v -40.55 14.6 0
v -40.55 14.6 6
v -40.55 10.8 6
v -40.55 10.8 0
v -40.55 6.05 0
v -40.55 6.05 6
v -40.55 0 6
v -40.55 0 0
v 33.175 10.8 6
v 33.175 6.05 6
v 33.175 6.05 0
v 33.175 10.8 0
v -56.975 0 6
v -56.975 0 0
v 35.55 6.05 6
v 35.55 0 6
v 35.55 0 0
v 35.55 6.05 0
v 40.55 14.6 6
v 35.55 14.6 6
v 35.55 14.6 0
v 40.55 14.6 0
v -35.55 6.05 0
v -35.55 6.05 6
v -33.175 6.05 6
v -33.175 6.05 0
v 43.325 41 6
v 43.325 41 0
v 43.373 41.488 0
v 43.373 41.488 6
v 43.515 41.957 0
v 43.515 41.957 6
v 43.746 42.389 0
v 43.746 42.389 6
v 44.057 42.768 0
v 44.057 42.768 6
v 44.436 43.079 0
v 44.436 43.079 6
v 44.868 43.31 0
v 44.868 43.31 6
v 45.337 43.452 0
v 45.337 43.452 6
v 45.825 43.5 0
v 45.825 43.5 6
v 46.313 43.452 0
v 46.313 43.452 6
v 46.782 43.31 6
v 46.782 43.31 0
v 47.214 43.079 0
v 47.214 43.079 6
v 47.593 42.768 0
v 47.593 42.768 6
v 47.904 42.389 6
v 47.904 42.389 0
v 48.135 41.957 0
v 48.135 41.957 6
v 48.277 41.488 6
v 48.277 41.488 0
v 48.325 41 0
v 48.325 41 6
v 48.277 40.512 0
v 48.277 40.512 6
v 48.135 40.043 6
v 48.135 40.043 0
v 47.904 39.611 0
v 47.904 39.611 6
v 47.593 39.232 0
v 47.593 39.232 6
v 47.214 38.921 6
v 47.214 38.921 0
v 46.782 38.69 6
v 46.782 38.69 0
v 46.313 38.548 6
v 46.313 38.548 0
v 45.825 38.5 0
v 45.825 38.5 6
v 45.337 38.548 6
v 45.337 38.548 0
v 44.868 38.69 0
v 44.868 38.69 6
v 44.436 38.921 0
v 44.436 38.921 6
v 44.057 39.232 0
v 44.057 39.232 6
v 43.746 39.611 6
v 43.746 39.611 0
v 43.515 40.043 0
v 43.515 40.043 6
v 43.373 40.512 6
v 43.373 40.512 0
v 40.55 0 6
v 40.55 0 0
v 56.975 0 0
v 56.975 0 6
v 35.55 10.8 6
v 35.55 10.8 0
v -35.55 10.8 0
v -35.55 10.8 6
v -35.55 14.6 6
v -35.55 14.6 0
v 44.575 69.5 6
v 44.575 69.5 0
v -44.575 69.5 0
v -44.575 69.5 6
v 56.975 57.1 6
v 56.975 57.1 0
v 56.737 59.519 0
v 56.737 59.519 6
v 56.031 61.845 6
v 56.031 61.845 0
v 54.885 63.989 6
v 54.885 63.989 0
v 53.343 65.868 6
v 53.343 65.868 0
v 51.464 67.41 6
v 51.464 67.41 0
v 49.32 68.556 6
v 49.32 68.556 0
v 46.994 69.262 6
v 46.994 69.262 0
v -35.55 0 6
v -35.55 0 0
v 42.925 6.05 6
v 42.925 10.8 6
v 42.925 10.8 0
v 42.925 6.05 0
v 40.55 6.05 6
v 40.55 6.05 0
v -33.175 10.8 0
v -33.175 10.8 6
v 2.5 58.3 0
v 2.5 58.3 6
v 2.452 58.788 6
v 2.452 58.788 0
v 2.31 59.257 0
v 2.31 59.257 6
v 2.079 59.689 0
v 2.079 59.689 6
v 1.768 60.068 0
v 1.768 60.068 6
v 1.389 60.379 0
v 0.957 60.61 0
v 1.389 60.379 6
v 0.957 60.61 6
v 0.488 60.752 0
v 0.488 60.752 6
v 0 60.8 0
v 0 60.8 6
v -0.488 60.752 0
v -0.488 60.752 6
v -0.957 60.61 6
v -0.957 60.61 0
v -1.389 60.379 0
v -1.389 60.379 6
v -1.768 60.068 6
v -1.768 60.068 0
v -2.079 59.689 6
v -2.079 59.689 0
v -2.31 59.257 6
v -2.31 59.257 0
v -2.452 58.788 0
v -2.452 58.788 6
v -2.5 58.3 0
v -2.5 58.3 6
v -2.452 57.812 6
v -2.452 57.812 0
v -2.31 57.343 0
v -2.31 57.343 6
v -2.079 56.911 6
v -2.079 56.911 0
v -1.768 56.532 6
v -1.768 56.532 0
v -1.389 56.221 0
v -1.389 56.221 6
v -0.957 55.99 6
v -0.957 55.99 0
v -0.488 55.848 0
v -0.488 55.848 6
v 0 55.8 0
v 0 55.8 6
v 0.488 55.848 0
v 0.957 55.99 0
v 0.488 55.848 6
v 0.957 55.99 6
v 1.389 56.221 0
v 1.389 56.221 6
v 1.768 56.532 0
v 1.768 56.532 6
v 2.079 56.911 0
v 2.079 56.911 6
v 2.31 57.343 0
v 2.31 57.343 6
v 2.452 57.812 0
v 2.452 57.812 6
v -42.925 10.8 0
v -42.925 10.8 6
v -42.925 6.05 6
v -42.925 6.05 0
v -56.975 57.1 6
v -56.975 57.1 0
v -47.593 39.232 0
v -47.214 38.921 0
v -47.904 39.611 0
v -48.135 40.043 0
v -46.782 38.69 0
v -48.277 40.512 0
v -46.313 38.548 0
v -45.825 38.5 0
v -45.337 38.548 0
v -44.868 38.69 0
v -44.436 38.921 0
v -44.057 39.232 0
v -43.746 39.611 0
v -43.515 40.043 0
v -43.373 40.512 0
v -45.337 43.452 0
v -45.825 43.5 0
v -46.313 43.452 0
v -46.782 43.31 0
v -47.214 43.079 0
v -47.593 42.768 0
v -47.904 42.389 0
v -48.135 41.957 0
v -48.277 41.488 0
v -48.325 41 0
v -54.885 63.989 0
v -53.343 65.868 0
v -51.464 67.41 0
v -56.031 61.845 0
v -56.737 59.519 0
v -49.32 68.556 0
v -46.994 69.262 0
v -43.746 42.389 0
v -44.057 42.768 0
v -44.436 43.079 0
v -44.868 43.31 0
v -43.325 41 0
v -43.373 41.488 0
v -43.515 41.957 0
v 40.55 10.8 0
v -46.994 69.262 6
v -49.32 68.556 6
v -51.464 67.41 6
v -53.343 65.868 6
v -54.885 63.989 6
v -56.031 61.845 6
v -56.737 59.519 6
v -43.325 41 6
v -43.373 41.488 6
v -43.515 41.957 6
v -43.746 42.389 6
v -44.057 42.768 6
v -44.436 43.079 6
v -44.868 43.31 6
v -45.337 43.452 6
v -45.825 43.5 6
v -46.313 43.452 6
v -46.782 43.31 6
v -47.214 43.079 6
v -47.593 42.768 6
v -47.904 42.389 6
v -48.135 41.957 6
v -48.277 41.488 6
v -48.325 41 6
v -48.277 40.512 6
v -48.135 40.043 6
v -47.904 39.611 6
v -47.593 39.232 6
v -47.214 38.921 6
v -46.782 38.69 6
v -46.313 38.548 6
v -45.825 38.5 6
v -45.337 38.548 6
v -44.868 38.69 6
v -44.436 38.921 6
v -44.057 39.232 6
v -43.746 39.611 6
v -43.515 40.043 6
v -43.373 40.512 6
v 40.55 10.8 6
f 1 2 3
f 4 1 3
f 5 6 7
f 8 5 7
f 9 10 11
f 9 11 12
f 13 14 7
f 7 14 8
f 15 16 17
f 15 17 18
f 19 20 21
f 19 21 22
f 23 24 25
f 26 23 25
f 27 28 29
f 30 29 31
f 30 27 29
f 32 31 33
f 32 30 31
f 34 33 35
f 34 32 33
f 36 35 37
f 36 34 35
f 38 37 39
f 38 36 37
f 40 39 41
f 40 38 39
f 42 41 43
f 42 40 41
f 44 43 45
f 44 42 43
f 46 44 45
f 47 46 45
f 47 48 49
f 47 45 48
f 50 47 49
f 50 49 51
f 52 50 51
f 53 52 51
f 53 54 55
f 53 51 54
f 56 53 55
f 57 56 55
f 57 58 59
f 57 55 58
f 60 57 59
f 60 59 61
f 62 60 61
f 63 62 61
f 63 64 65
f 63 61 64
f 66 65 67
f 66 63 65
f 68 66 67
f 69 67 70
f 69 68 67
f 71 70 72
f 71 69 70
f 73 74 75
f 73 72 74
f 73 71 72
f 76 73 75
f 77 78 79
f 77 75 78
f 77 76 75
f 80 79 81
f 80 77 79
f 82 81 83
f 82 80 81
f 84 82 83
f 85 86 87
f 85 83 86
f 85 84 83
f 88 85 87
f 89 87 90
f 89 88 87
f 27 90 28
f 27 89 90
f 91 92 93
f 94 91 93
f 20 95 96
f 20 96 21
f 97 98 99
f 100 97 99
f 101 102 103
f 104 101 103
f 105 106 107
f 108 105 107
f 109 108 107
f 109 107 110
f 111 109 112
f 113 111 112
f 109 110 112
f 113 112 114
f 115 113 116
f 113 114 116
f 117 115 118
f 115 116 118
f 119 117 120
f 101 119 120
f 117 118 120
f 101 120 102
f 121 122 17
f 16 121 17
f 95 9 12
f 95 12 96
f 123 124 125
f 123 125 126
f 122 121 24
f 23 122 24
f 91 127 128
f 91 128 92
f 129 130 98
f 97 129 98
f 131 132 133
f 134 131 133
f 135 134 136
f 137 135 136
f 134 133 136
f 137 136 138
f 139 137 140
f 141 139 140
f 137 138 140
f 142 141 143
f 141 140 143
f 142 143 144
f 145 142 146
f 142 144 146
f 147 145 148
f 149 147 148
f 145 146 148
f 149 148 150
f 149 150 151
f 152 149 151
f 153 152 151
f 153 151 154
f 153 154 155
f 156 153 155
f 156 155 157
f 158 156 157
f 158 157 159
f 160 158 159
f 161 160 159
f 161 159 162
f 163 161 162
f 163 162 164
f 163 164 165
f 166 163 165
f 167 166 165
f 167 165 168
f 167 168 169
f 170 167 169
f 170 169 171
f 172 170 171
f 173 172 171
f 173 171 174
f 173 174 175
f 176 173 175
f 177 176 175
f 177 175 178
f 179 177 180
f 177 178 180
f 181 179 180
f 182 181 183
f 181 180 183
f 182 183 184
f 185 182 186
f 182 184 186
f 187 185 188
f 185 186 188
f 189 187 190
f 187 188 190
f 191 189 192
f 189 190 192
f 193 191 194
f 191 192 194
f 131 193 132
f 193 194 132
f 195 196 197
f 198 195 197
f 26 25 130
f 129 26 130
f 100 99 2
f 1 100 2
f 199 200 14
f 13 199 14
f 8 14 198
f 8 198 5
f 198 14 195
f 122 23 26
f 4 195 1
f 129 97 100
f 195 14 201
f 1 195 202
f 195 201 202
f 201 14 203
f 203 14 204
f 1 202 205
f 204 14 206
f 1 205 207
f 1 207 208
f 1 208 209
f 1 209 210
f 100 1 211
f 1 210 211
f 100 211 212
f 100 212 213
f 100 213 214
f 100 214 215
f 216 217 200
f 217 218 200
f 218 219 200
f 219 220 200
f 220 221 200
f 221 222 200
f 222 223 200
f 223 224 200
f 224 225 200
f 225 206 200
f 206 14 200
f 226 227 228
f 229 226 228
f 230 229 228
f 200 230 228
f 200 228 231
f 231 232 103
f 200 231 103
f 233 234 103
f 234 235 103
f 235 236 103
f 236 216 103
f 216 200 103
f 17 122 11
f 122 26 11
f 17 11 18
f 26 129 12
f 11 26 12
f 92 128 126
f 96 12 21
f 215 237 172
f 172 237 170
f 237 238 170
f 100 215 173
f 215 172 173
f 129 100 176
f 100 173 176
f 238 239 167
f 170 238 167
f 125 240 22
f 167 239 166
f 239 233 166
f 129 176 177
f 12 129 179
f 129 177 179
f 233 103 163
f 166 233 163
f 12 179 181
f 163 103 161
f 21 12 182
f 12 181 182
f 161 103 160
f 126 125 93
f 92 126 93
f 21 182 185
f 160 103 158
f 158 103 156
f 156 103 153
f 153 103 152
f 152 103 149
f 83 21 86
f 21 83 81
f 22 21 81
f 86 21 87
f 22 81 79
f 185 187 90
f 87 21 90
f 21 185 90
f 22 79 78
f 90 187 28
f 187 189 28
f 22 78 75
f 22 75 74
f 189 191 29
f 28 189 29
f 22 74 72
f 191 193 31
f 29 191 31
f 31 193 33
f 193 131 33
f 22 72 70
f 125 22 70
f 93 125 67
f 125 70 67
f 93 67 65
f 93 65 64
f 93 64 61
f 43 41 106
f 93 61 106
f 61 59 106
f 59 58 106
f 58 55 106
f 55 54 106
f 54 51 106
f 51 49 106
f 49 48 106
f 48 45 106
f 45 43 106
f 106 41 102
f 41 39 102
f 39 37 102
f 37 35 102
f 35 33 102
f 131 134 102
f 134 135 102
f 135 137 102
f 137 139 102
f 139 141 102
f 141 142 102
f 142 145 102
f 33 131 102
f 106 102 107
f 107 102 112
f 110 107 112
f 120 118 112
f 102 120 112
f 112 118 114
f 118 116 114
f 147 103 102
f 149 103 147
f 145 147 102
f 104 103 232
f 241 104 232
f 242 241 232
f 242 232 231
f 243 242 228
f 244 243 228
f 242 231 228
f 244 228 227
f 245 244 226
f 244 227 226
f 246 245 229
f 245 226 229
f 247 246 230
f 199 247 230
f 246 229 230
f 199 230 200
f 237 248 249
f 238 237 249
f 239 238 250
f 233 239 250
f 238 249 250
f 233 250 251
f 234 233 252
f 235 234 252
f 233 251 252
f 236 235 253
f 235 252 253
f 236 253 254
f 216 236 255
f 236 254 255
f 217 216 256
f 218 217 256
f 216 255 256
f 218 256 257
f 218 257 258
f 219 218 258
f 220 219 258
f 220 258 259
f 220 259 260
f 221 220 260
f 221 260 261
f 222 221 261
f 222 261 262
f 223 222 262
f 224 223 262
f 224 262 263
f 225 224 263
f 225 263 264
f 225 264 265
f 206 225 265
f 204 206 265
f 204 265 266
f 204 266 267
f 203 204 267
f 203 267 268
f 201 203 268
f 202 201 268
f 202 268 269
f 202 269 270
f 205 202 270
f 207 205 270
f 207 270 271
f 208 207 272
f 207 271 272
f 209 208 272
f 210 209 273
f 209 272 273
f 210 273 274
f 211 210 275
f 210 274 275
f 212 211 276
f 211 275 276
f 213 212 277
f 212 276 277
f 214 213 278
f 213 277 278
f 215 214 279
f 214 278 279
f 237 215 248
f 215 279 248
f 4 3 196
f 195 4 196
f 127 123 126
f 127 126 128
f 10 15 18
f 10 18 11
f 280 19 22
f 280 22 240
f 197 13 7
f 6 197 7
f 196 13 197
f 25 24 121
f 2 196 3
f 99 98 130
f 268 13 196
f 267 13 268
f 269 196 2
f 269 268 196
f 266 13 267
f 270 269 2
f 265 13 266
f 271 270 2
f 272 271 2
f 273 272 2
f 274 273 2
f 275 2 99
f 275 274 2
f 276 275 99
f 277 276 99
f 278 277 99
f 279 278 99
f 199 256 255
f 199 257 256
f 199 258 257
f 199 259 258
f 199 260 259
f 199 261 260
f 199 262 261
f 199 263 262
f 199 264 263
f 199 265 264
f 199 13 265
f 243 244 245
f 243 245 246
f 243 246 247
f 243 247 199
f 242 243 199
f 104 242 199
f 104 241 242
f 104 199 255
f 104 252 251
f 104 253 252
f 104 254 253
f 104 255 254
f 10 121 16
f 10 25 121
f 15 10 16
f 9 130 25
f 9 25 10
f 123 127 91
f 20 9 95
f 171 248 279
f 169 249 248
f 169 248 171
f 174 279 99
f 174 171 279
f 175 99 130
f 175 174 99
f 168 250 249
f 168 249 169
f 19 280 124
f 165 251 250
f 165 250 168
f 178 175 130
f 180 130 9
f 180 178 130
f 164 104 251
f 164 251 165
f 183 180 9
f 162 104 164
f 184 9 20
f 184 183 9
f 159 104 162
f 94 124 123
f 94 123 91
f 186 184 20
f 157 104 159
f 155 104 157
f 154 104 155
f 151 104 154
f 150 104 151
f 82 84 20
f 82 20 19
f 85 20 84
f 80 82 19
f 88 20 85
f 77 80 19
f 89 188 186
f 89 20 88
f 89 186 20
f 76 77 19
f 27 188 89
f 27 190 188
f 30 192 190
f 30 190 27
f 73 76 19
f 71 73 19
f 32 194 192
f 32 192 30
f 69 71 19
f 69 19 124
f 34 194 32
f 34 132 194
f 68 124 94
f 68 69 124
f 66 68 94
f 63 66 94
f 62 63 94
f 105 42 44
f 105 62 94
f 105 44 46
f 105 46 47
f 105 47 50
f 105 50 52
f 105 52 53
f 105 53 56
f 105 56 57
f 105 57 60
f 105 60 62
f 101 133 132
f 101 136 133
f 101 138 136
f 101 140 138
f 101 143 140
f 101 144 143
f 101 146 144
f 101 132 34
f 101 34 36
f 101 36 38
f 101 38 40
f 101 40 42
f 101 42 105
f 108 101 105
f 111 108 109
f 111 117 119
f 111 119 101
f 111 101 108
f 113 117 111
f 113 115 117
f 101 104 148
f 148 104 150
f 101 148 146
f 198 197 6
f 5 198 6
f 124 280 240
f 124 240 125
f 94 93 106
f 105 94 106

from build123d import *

# Parameters (mm, degrees)
BOSS_EXTRUDE1_DEPTH = 6
CUT_EXTRUDE1_DEPTH  = 91.068866014
SKETCH4_R           = 2.5
HOLE1_DEPTH         = 91.068866014
SKETCH5_R           = 2.5
HOLE2_DEPTH         = 91.068866014


with BuildPart() as part:
    # Sketch2 → Boss-Extrude1 (new body)
    with BuildSketch(Plane.XY):
        with BuildLine():
            Line((-56.975, 0), (56.975, 0))
            Line((56.975, 0), (56.975, 57.1))
            ThreePointArc((56.975, 57.1), (53.343124087, 65.868124087), (44.575, 69.5))
            Line((44.575, 69.5), (-44.575, 69.5))
            ThreePointArc((-44.575, 69.5), (-53.343124087, 65.868124087), (-56.975, 57.1))
            Line((-56.975, 57.1), (-56.975, 0))
        make_face()
    extrude(amount=BOSS_EXTRUDE1_DEPTH)

    # Sketch3 → Cut-Extrude1 (cut, through all)
    with BuildSketch(Plane.XY.offset(6)):
        Polygon((-40.55, 0), (-35.55, 0), (-35.55, 6.05), (-33.175, 6.05), (-33.175, 10.8), (-35.55, 10.8), (-35.55, 14.6), (-40.55, 14.6), (-40.55, 10.8), (-42.925, 10.8), (-42.925, 6.05), (-40.55, 6.05), align=None)
    cut_extrude1 = extrude(amount=-CUT_EXTRUDE1_DEPTH, mode=Mode.SUBTRACT)

    # Sketch4 → Hole1 (cut, through all)
    with BuildSketch(Plane.XY.offset(6)):
        with Locations((-45.825, 41)):
            Circle(SKETCH4_R)
    hole1 = extrude(amount=-HOLE1_DEPTH, mode=Mode.SUBTRACT)

    # Sketch5 → Hole2 (cut, through all)
    with BuildSketch(Plane.XY.offset(6)):
        with Locations((0, 58.3)):
            Circle(SKETCH5_R)
    extrude(amount=-HOLE2_DEPTH, mode=Mode.SUBTRACT)

    # Mirror1: Cut-Extrude1, Hole1 across plane
    add(cut_extrude1.mirror(Plane(origin=(0, 0, 0), x_dir=(0, 0, 1), z_dir=(1, 0, 0))), mode=Mode.SUBTRACT)
    add(hole1.mirror(Plane(origin=(0, 0, 0), x_dir=(0, 0, 1), z_dir=(1, 0, 0))), mode=Mode.SUBTRACT)


solid = part.part
